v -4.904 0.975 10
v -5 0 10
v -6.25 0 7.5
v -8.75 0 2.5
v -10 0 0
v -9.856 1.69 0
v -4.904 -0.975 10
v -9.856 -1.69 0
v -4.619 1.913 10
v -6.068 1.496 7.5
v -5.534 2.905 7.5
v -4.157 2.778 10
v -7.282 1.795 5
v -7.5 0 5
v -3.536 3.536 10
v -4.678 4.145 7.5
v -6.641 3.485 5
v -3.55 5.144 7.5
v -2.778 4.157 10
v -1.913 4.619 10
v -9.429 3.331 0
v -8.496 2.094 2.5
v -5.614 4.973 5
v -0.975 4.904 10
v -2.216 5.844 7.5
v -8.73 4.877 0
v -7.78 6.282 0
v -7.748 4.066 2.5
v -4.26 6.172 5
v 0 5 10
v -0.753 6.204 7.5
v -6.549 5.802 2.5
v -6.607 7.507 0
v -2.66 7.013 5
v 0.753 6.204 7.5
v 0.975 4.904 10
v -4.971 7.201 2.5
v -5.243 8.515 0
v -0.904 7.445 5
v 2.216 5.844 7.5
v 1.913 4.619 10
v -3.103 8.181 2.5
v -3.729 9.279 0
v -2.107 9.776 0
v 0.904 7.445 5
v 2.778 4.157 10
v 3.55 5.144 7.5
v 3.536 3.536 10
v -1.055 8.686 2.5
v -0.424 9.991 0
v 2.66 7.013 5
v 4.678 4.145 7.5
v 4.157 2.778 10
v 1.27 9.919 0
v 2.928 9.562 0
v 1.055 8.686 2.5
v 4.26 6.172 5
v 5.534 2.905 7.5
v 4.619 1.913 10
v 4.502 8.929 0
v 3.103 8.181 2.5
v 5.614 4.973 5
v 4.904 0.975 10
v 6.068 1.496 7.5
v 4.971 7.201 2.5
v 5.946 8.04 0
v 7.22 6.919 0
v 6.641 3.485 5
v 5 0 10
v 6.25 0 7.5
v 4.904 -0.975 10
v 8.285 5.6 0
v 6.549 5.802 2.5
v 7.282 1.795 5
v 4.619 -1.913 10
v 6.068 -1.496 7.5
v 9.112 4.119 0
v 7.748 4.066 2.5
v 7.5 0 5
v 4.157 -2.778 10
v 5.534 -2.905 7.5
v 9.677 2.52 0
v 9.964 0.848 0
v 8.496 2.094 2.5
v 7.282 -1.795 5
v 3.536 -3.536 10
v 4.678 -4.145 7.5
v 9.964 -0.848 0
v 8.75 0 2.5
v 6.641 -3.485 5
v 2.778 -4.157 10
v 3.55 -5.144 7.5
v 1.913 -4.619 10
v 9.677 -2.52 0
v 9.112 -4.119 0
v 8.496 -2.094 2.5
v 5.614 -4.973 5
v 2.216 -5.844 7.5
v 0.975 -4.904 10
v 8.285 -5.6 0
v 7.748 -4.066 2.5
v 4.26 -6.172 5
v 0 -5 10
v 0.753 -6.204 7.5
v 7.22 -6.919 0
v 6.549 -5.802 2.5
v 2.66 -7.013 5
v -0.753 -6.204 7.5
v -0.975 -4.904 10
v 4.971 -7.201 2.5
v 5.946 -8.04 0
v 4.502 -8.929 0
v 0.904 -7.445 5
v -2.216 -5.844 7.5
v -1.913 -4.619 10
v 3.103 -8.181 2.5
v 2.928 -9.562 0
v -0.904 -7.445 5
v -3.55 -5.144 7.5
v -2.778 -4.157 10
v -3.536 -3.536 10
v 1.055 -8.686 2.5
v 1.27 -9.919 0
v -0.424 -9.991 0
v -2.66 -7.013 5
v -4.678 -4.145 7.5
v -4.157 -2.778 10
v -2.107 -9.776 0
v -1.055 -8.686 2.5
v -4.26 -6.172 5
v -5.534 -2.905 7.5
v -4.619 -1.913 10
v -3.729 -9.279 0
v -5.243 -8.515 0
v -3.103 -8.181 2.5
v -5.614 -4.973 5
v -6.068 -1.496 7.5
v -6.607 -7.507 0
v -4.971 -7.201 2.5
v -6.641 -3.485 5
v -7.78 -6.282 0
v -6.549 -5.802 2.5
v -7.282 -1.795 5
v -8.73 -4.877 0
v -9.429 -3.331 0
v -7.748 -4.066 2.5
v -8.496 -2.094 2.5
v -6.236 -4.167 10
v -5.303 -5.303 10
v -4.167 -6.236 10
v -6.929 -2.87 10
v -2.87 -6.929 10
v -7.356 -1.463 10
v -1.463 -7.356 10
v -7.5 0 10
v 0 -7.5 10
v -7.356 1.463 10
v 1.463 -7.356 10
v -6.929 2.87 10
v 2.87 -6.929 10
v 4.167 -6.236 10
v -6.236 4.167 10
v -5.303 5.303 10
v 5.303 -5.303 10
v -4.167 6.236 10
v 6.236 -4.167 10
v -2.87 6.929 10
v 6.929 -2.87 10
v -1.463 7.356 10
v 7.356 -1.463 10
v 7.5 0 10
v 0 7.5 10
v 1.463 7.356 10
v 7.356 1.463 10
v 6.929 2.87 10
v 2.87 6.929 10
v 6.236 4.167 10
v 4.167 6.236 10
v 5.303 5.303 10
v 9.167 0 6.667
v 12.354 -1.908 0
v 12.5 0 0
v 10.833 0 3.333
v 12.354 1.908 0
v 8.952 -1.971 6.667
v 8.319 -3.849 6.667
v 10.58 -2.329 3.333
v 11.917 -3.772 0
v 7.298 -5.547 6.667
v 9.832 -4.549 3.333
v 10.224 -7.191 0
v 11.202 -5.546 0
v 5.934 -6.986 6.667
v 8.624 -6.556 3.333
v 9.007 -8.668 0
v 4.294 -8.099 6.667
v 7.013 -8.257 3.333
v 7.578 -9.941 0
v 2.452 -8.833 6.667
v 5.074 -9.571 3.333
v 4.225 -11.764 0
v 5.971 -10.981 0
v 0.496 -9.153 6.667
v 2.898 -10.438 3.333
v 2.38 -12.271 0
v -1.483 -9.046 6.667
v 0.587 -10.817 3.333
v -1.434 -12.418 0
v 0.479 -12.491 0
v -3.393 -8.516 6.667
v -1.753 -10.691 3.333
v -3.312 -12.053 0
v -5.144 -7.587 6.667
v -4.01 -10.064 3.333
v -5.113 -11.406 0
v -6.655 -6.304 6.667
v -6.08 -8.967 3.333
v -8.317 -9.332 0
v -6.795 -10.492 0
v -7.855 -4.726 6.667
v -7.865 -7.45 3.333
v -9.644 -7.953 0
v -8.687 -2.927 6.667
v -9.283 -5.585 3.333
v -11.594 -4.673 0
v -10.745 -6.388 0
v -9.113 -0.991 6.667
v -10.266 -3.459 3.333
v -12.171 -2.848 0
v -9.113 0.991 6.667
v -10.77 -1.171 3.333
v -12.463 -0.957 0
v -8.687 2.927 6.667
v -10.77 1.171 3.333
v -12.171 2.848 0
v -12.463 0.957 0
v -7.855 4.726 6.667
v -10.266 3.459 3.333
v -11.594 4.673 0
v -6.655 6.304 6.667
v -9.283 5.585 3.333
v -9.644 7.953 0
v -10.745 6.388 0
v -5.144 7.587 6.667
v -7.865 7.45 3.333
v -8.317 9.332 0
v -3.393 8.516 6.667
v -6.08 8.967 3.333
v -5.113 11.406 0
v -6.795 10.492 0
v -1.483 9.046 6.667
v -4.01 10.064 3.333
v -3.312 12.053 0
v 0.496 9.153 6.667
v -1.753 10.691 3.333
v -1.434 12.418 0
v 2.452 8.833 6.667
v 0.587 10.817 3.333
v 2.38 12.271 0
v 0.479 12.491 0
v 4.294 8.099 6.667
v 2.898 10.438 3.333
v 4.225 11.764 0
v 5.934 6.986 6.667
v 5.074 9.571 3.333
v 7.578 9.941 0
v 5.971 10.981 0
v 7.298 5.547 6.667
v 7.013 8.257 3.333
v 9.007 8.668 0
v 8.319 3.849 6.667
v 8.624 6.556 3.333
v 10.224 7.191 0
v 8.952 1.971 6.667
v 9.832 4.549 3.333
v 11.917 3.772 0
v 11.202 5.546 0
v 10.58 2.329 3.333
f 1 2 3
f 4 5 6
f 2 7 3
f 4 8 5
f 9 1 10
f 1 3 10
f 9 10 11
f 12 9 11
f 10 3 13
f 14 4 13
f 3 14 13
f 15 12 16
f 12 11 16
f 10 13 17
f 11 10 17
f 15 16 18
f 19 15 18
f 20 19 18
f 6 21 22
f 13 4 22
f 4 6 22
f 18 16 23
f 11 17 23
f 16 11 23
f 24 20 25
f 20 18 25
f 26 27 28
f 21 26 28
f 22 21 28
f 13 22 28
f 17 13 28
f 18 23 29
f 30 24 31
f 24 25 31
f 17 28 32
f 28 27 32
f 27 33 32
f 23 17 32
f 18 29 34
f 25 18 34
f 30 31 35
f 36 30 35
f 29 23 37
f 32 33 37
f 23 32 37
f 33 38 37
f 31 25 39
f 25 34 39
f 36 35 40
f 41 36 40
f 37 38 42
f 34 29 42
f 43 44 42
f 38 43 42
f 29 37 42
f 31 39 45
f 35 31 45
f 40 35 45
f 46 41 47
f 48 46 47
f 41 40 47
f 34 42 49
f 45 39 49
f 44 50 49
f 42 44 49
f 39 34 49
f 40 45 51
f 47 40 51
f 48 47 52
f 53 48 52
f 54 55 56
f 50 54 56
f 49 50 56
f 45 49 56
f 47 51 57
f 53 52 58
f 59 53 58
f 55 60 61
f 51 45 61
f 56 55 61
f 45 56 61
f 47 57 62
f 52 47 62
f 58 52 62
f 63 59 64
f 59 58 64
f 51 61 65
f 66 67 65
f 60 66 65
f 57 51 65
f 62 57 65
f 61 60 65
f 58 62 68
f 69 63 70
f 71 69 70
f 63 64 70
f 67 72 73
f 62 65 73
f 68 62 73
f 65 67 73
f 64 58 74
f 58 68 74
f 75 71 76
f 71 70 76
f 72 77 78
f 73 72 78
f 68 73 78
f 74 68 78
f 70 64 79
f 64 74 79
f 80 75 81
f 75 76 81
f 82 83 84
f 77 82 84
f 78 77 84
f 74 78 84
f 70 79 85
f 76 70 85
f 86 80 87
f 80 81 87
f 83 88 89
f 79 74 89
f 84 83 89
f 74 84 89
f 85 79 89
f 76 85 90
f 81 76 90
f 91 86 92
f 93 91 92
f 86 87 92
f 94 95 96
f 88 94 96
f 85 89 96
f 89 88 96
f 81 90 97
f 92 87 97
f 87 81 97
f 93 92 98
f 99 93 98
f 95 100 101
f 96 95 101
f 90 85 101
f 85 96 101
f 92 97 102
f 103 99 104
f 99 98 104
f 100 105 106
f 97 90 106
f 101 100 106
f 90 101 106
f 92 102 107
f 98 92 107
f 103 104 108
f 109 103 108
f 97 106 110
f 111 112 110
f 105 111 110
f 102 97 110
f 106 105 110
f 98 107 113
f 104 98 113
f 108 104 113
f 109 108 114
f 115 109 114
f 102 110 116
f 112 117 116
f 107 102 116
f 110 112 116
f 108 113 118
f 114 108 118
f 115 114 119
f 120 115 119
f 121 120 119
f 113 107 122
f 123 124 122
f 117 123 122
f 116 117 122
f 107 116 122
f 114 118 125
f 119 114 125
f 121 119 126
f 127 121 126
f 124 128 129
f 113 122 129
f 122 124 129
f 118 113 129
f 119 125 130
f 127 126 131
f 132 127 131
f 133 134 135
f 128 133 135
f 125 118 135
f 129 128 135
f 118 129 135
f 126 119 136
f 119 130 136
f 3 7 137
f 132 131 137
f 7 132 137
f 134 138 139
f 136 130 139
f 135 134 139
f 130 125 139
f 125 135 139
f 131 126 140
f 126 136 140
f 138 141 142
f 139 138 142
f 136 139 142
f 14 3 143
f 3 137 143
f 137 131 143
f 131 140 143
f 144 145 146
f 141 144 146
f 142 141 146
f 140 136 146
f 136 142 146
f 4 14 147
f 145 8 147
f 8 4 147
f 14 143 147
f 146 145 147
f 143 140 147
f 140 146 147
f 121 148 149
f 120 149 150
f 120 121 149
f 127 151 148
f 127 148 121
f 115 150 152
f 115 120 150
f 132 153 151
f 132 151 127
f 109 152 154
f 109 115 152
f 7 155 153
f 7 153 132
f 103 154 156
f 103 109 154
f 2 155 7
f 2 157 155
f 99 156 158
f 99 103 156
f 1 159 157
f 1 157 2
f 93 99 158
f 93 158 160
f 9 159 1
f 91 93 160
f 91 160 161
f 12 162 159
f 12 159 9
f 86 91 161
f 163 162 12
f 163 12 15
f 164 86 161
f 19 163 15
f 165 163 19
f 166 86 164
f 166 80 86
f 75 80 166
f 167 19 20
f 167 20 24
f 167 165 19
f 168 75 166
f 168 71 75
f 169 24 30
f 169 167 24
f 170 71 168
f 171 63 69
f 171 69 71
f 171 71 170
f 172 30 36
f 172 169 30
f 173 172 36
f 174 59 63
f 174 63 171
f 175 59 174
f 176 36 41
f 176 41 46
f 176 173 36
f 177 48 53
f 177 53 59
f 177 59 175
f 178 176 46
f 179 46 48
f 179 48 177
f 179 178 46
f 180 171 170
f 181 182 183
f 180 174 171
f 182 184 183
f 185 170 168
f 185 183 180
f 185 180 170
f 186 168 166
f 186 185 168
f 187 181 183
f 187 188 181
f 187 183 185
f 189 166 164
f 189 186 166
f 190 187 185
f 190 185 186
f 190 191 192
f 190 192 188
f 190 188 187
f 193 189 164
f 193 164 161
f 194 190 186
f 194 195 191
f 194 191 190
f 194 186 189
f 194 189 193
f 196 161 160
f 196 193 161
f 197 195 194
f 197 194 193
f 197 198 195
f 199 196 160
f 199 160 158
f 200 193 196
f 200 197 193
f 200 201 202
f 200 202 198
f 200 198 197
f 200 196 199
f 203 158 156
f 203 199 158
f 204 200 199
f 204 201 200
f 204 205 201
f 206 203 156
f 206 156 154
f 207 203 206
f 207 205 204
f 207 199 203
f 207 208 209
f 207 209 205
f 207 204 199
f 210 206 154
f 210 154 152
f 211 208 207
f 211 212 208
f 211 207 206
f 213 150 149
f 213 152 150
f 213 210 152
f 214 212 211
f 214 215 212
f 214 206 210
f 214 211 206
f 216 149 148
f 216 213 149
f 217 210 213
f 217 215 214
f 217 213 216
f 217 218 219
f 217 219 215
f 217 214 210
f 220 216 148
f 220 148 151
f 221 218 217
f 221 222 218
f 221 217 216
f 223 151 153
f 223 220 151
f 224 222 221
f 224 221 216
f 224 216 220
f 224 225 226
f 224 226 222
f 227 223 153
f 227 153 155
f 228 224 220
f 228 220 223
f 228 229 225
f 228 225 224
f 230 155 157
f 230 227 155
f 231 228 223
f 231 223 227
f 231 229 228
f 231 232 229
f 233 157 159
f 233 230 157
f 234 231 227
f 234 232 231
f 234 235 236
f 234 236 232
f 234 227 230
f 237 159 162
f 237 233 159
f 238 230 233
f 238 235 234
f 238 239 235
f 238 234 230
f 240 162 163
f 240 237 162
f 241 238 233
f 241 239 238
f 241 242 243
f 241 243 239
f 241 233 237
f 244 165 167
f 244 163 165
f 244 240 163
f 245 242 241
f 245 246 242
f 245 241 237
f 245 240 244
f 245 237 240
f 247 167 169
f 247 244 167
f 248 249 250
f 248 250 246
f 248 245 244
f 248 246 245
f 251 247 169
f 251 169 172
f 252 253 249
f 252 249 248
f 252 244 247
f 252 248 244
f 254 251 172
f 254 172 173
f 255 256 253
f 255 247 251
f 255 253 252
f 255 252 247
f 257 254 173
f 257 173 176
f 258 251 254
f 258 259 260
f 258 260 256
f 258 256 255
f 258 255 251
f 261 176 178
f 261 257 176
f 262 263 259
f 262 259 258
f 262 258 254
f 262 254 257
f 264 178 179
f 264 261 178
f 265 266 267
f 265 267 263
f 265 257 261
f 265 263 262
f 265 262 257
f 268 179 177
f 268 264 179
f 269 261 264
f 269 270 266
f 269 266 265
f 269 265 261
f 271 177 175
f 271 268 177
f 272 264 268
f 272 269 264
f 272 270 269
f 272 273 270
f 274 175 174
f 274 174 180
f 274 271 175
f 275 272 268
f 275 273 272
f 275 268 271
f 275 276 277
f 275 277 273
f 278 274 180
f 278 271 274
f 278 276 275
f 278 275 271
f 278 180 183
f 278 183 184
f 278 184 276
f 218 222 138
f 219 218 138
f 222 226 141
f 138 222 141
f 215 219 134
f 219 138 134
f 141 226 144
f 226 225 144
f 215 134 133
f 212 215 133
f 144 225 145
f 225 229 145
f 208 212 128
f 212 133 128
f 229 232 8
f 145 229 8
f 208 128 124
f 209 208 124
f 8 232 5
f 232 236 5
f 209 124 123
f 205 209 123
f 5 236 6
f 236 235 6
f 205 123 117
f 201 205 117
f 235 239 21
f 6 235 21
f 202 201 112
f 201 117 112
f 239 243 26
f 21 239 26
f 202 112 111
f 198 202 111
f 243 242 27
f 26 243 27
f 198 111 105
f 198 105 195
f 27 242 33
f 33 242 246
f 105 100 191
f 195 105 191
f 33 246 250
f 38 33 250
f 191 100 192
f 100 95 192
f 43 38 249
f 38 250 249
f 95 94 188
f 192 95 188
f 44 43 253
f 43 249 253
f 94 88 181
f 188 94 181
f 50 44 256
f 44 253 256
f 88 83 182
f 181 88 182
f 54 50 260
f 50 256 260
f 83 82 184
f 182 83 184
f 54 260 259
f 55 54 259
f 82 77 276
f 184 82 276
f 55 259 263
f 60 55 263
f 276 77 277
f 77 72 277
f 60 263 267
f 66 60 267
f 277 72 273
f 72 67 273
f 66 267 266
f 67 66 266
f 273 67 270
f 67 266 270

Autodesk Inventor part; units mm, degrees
ref_plane "YZ Plane" through (0, 0, 0) normal (1, 0, 0) x (0, 1, 0)
ref_plane "XZ Plane" through (0, 0, 0) normal (0, 1, 0) x (-1, 0, 0)
sketch "Esquisse1" plane through (0, 0, 0) normal (0, 0, 1) x (1, 0, 0)
  circle A0 centre (0, 0) radius 12.5
  dimension "d0" = 25
ref_plane "Plan de construction4" through (0, 0, 10) normal (0, 0, 1) x (1, 0, 0)
sketch "Esquisse2" plane through (0, 0, 10) normal (0, 0, 1) x (1, 0, 0)
  circle A0 centre (0, 0) radius 7.5
  dimension "d2" = 15
loft "Lissage1" add profiles "Esquisse1", "Esquisse2"
sketch "Esquisse3" plane through (0, 0, 10) normal (0, 0, 1) x (1, 0, 0)
  circle A0 centre (0, 0) radius 5
  dimension "d7" = 10
sketch "Esquisse4" plane through (0, 0, 0) normal (0, 0, -1) x (-1, 0, 0)
  circle A0 centre (0, 0) radius 10
  dimension "d8" = 20
extrude "Extrusion1" cut sketch "Esquisse3" against normal blind 22
loft "Lissage2" cut profiles "Esquisse4" section 2 edges at (-5, 0, 10)
properties part number "Frustrum"
